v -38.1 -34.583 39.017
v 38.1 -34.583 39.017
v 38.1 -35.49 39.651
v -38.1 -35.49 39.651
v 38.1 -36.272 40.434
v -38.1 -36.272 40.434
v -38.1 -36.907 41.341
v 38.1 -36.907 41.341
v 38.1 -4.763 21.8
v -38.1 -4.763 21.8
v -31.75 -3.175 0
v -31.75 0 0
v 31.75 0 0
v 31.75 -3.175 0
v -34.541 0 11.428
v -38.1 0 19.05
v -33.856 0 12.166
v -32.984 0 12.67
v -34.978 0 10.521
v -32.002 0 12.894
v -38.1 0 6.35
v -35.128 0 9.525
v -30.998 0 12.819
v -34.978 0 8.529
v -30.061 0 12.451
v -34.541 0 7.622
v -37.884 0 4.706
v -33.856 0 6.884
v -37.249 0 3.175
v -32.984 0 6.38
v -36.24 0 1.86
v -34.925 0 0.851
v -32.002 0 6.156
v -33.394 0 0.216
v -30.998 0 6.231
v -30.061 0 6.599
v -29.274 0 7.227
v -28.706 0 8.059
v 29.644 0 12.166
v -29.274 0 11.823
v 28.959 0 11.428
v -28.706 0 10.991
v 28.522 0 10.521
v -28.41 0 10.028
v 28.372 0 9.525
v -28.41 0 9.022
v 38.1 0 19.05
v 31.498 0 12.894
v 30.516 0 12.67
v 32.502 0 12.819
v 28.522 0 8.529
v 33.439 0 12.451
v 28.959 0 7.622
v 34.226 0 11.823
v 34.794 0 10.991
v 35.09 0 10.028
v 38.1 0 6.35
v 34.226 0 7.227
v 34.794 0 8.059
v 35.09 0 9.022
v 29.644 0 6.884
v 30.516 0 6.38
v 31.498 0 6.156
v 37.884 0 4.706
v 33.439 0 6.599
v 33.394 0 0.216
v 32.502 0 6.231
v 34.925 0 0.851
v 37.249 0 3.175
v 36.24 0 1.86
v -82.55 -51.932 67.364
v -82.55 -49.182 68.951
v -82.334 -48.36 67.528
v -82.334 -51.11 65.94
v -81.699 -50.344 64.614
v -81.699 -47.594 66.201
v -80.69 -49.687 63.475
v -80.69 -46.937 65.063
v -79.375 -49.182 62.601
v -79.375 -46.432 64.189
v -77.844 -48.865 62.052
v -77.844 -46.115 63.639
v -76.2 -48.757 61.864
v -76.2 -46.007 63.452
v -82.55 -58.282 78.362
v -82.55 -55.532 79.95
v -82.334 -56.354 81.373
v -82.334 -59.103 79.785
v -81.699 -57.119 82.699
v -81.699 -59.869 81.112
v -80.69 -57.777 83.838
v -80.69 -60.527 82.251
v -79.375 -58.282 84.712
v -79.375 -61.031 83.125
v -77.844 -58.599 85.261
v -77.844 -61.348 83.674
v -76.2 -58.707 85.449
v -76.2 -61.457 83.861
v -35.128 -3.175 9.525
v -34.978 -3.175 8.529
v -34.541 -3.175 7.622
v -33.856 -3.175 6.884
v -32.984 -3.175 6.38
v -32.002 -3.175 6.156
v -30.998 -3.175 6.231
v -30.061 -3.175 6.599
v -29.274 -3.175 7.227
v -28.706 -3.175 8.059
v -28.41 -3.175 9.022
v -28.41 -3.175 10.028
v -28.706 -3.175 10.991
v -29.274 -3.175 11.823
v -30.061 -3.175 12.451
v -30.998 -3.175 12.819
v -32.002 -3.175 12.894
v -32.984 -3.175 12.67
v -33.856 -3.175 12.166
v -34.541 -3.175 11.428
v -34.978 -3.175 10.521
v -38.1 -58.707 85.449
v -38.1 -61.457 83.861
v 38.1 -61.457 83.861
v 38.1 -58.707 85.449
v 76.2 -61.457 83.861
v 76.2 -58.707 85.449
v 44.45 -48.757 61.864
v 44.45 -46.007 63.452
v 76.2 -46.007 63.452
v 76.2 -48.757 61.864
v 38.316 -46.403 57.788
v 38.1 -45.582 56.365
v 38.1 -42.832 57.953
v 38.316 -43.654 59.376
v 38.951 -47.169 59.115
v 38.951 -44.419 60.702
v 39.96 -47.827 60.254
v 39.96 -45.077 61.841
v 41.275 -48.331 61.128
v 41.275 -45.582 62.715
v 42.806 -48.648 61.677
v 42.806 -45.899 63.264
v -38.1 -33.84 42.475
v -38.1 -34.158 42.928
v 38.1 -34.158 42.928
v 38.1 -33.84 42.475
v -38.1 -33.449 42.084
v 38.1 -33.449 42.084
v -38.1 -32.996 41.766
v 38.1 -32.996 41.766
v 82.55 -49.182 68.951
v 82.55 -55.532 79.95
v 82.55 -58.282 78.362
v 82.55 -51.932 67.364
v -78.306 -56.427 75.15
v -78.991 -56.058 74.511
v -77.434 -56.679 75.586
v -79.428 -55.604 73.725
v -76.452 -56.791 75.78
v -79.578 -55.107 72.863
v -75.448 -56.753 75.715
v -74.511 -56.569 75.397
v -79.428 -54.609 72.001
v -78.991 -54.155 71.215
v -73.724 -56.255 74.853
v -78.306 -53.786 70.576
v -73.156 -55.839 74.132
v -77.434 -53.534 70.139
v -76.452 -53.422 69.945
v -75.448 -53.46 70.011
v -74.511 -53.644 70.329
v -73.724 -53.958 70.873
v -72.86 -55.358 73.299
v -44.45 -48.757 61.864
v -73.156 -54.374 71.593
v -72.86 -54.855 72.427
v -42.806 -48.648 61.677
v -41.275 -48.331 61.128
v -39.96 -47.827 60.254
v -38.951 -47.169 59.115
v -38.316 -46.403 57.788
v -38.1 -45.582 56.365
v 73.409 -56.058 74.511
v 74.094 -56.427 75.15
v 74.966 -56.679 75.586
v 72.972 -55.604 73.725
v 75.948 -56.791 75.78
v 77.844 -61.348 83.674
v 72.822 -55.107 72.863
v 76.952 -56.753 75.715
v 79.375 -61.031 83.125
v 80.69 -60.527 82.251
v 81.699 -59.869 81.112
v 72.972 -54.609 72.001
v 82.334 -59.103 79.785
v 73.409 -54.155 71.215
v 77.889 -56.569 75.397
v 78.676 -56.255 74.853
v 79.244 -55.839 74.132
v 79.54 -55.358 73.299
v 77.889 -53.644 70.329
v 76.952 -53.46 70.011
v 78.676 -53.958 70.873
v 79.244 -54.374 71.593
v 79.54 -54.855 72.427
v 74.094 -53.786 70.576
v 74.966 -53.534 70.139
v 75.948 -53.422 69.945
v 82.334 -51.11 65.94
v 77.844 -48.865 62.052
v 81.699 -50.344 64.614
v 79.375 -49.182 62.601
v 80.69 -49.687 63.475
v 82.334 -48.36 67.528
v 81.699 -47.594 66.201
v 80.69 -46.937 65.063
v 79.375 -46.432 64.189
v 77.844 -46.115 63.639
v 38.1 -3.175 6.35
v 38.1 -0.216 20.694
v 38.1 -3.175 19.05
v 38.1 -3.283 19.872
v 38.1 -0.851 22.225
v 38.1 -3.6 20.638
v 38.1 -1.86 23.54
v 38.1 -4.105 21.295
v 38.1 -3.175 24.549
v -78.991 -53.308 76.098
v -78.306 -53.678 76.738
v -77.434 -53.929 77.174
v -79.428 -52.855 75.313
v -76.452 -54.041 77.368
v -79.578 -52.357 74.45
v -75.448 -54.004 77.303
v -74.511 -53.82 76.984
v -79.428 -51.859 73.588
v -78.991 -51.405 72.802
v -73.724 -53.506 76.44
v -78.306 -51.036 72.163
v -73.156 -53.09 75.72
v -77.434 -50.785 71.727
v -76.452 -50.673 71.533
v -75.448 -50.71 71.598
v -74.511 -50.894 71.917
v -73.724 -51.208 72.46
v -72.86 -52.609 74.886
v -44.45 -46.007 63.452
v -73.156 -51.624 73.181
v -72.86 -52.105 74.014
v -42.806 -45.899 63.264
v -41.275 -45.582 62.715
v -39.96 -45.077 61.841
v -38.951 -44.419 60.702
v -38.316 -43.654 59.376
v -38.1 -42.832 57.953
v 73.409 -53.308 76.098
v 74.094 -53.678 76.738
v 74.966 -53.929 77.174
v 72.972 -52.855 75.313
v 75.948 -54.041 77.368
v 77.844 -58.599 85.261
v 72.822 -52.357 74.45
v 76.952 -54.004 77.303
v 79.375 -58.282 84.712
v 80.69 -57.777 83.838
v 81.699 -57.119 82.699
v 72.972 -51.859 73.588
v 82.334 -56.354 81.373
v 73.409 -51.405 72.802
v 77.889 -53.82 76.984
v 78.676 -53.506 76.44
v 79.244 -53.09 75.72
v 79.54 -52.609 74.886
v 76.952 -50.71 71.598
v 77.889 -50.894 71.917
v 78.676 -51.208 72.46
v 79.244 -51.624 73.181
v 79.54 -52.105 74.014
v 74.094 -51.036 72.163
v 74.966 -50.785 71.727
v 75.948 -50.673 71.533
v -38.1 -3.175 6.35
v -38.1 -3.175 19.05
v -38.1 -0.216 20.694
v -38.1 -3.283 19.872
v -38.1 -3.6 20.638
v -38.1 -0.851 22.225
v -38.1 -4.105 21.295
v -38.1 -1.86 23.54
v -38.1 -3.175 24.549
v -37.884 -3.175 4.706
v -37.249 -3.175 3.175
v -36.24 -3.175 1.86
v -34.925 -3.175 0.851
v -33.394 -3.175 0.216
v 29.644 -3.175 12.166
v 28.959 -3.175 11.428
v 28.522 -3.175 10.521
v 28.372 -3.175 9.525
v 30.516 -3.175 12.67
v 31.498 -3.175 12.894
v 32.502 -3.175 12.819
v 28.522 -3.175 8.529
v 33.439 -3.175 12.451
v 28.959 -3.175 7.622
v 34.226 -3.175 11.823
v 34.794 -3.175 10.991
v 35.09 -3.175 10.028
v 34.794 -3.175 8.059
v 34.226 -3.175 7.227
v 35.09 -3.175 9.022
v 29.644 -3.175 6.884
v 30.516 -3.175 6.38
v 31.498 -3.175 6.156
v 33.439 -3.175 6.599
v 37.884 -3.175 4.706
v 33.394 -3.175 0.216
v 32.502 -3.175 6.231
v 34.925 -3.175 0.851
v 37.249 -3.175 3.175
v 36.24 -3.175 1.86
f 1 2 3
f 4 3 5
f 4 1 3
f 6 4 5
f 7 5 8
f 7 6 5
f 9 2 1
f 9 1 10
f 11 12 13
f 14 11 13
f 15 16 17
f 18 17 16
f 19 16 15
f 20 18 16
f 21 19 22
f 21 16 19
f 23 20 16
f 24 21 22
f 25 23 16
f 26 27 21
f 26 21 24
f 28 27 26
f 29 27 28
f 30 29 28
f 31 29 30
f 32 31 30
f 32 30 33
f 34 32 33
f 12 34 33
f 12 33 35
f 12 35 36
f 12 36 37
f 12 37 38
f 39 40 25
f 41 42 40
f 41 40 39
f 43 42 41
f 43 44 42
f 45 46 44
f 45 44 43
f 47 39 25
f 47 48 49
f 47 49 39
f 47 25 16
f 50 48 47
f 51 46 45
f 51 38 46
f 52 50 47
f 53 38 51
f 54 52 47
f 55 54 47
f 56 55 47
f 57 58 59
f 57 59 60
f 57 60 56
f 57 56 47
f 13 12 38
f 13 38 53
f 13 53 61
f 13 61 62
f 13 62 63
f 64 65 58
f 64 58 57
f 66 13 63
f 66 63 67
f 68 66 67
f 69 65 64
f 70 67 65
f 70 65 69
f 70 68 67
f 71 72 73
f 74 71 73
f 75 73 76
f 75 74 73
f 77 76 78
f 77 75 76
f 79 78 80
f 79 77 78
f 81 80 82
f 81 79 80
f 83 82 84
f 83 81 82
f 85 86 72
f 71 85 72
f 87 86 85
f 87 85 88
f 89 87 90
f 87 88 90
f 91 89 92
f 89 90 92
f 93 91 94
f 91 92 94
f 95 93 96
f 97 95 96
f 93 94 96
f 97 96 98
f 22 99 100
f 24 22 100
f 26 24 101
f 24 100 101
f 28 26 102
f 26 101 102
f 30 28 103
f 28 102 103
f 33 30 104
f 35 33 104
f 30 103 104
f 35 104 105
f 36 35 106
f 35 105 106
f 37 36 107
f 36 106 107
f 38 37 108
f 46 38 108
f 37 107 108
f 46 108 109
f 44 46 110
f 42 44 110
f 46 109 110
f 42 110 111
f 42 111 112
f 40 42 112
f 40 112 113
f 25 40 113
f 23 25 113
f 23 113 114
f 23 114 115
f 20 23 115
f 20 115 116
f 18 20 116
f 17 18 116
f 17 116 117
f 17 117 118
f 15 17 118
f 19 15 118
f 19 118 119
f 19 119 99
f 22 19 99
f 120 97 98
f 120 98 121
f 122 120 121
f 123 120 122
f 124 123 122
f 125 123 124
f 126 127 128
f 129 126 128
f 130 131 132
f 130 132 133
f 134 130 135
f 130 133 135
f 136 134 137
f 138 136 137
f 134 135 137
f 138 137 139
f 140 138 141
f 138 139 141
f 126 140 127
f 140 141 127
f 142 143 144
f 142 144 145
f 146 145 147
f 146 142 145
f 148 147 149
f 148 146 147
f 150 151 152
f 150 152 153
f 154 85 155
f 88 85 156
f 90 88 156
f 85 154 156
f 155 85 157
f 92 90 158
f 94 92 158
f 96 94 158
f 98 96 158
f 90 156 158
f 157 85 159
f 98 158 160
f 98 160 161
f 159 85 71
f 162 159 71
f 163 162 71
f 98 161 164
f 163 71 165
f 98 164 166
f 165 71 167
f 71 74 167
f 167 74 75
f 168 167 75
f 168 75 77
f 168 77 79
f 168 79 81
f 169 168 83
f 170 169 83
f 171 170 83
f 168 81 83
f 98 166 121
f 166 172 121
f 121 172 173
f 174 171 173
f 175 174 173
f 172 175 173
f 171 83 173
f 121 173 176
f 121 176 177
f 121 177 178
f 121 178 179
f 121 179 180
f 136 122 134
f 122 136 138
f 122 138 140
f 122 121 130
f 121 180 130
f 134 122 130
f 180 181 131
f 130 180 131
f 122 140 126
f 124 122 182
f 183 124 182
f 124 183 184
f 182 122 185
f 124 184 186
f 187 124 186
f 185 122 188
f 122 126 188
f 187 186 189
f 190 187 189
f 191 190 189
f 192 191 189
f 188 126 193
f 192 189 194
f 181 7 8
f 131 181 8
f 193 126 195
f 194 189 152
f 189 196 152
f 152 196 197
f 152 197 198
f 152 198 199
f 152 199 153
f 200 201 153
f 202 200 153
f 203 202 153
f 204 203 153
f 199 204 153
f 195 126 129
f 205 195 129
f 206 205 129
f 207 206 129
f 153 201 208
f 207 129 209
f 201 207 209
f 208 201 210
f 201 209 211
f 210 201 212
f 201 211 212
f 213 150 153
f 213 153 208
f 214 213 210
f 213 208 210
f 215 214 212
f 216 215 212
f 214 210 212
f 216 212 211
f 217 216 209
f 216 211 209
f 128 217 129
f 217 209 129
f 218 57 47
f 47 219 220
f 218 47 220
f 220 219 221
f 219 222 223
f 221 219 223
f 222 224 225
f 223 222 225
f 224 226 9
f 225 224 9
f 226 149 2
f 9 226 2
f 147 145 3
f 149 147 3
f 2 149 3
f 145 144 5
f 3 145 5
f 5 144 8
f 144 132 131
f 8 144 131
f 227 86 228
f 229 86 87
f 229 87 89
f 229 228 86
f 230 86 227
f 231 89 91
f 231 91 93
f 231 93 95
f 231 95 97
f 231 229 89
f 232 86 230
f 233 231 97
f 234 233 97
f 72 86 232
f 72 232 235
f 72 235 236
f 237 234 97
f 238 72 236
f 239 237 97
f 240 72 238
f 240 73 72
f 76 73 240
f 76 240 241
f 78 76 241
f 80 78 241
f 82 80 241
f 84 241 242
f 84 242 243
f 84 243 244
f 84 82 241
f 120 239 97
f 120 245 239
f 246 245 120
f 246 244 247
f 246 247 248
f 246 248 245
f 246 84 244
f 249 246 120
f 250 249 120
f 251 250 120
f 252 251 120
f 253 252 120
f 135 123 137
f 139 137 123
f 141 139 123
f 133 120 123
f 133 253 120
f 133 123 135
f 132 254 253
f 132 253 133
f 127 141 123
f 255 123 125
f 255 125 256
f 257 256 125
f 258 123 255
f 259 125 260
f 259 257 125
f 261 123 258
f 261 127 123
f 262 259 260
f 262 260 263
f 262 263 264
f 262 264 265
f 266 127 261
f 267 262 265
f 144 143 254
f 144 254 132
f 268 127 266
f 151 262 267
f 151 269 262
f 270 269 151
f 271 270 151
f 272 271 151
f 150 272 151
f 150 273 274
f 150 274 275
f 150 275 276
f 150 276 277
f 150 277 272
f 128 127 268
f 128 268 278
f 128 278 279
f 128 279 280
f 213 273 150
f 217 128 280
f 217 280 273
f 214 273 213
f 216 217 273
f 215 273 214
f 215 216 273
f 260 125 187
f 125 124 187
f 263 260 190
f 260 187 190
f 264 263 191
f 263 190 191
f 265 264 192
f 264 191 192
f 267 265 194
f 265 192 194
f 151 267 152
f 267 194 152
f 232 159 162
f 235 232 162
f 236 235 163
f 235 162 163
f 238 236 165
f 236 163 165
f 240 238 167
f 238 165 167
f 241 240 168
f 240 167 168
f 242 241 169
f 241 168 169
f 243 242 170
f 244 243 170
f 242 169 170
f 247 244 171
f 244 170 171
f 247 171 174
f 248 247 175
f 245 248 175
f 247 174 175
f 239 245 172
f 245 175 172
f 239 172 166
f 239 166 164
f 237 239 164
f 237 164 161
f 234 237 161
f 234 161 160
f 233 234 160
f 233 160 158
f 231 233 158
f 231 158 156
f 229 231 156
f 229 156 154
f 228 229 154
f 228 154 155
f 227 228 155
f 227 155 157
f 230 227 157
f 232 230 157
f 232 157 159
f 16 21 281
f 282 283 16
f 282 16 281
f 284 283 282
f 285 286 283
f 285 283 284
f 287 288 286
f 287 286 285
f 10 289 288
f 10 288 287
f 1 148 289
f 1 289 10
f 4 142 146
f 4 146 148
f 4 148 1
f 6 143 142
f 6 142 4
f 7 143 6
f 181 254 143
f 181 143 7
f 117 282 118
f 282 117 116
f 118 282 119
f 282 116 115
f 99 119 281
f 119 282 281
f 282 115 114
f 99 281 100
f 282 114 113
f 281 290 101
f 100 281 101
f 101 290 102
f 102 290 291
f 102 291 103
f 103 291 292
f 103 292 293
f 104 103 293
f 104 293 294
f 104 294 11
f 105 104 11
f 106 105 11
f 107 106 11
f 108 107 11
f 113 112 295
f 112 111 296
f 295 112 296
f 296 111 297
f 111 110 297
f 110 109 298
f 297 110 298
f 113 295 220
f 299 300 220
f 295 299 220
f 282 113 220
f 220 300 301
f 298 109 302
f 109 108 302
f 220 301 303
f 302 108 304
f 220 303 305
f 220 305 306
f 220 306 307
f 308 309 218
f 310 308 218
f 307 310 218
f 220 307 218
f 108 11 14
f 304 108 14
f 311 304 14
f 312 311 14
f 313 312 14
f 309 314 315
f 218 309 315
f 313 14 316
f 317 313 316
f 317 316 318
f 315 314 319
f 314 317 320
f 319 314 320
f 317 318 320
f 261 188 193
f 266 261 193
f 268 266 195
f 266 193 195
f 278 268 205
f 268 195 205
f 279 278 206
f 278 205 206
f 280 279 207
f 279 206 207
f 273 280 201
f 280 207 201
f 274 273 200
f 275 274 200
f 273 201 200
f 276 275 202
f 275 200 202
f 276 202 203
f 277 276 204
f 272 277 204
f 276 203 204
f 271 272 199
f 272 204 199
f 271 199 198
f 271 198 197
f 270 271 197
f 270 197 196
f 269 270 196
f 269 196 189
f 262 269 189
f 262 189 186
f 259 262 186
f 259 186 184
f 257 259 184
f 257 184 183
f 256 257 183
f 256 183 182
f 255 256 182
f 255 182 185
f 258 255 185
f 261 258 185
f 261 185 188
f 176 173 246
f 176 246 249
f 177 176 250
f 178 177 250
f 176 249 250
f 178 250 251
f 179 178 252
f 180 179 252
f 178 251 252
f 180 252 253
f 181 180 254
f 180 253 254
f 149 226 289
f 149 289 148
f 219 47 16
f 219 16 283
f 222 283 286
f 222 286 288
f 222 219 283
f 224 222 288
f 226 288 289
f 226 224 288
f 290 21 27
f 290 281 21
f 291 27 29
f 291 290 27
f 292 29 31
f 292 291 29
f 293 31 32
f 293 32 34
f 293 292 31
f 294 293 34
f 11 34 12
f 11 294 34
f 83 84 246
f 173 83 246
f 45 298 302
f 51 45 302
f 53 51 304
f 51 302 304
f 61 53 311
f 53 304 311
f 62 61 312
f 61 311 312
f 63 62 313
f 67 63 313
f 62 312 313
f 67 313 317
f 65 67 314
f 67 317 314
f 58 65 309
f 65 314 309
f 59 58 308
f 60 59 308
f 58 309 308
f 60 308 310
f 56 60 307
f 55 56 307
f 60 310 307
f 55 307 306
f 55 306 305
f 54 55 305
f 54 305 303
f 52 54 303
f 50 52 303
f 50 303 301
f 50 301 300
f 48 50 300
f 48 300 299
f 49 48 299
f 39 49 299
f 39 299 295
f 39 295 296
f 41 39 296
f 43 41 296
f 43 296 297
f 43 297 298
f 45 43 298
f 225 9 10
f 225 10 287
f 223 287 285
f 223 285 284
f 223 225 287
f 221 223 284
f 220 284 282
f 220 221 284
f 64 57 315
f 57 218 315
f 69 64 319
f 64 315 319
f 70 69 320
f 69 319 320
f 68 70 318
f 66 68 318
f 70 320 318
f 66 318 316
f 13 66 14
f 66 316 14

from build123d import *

# Parameters (mm, degrees)
SKETCH1_W               = 76.2
SKETCH1_H               = 19.05
BASE_FLANGE1_DEPTH      = 3.175
EDGE_FLANGE1_DEPTH      = 76.2
EDGE_FLANGE2_DEPTH      = 76.2
F_1_4_CLEARANCE_HOLE1_D = 6.7564
SKETCH17_W              = 165.1
SKETCH17_H              = 25.4
BOSS_EXTRUDE1_DEPTH     = 3.175
F_1_4_CLEARANCE_HOLE3_D = 6.7564
FILLET1_R               = 6.35


# Sheet-metal steps are written as plain solids
with BuildPart() as part:
    # Sketch1 → Base-Flange1 (new body)
    with BuildSketch(Plane(origin=(0, 0, 0), x_dir=(1, 0, 0), z_dir=(0, 1, 0))):
        with Locations((0, -9.525)):
            Rectangle(SKETCH1_W, SKETCH1_H)
    extrude(amount=-BASE_FLANGE1_DEPTH)

    # Edge-Flange1 section (across the edge) → Edge-Flange1 (add)
    with BuildSketch(Plane(origin=(38.1, -3.175, 20.883087105), x_dir=(0, -0.5000000000000041, -0.8660254037844364), z_dir=(-1, 0, 0))):
        with BuildLine():
            Line((-3.175, 1.833087105), (-3.175, 36.266912895))
            Line((-3.175, 36.266912895), (0, 36.266912895))
            Line((0, 36.266912895), (0, 1.833087105))
            ThreePointArc((0, 1.833087105), (0.425369343, 0.245587105), (1.5875, -0.916543552))
            Line((1.5875, -0.916543552), (0, -3.666174209))
            ThreePointArc((0, -3.666174209), (-2.324261314, -1.341912895), (-3.175, 1.833087105))
        make_face()
    extrude(amount=EDGE_FLANGE1_DEPTH)

    # Edge-Flange2 section (across the edge) → Edge-Flange2 (add)
    with BuildSketch(Plane(origin=(-38.1, -33.732329198, 42.191543552), x_dir=(0, 0.866025403784438, 0.5000000000000012), z_dir=(1, 0, 0))):
        with BuildLine():
            Line((-3.175, 0.850738686), (-3.175, 49.949261314))
            Line((-3.175, 49.949261314), (0, 49.949261314))
            Line((0, 49.949261314), (0, 0.850738686))
            ThreePointArc((0, 0.850738686), (0.108185502, 0.028988218), (0.425369343, -0.736761314))
            Line((0.425369343, -0.736761314), (-2.324261314, -2.324261314))
            ThreePointArc((-2.324261314, -2.324261314), (-2.958628997, -0.79276225), (-3.175, 0.850738686))
        make_face()
    extrude(amount=EDGE_FLANGE2_DEPTH)

    # 1/4 Clearance Hole1 (through all)
    with Locations(Plane(origin=(0, 0, 0), x_dir=(1, 0, 0), z_dir=(0, 1, 0))):
        with Locations((-31.75, -9.525), (31.75, -9.525)):
            Hole(F_1_4_CLEARANCE_HOLE1_D / 2)

    # Sketch17 → Boss-Extrude1 (add)
    with BuildSketch(Plane(origin=(0, -7.029772628, -4.058641119), x_dir=(1, 0, 0), z_dir=(0, 0.866025403784438, 0.5000000000000012))):
        with Locations((0, -90.654374454)):
            Rectangle(SKETCH17_W, SKETCH17_H)
    extrude(amount=-BOSS_EXTRUDE1_DEPTH)

    # 1/4 Clearance Hole3 (through all)
    with Locations(Plane(origin=(0, -7.029772628, -4.058641119), x_dir=(1, 0, 0), z_dir=(0, 0.866025403784438, 0.5000000000000012))):
        with Locations((76.2, -90.654374454), (-76.2, -90.654374454)):
            Hole(F_1_4_CLEARANCE_HOLE3_D / 2)

    # Fillet1
    fillet1_edges = [part.edges().sort_by_distance(p)[0] for p in [
        (82.55, -60.081775184, 84.655122751),
        (-82.55, -47.381775184, 62.658077494),
        (82.55, -47.381775184, 62.658077494),
        (-82.55, -60.081775184, 84.655122751),
        (-38.1, -47.381775184, 62.658077494),
        (38.1, -47.381775184, 62.658077494),
        (-38.1, -1.5875, 0),
        (38.1, -1.5875, 0),
    ]]
    fillet(fillet1_edges, radius=FILLET1_R)


solid = part.part
